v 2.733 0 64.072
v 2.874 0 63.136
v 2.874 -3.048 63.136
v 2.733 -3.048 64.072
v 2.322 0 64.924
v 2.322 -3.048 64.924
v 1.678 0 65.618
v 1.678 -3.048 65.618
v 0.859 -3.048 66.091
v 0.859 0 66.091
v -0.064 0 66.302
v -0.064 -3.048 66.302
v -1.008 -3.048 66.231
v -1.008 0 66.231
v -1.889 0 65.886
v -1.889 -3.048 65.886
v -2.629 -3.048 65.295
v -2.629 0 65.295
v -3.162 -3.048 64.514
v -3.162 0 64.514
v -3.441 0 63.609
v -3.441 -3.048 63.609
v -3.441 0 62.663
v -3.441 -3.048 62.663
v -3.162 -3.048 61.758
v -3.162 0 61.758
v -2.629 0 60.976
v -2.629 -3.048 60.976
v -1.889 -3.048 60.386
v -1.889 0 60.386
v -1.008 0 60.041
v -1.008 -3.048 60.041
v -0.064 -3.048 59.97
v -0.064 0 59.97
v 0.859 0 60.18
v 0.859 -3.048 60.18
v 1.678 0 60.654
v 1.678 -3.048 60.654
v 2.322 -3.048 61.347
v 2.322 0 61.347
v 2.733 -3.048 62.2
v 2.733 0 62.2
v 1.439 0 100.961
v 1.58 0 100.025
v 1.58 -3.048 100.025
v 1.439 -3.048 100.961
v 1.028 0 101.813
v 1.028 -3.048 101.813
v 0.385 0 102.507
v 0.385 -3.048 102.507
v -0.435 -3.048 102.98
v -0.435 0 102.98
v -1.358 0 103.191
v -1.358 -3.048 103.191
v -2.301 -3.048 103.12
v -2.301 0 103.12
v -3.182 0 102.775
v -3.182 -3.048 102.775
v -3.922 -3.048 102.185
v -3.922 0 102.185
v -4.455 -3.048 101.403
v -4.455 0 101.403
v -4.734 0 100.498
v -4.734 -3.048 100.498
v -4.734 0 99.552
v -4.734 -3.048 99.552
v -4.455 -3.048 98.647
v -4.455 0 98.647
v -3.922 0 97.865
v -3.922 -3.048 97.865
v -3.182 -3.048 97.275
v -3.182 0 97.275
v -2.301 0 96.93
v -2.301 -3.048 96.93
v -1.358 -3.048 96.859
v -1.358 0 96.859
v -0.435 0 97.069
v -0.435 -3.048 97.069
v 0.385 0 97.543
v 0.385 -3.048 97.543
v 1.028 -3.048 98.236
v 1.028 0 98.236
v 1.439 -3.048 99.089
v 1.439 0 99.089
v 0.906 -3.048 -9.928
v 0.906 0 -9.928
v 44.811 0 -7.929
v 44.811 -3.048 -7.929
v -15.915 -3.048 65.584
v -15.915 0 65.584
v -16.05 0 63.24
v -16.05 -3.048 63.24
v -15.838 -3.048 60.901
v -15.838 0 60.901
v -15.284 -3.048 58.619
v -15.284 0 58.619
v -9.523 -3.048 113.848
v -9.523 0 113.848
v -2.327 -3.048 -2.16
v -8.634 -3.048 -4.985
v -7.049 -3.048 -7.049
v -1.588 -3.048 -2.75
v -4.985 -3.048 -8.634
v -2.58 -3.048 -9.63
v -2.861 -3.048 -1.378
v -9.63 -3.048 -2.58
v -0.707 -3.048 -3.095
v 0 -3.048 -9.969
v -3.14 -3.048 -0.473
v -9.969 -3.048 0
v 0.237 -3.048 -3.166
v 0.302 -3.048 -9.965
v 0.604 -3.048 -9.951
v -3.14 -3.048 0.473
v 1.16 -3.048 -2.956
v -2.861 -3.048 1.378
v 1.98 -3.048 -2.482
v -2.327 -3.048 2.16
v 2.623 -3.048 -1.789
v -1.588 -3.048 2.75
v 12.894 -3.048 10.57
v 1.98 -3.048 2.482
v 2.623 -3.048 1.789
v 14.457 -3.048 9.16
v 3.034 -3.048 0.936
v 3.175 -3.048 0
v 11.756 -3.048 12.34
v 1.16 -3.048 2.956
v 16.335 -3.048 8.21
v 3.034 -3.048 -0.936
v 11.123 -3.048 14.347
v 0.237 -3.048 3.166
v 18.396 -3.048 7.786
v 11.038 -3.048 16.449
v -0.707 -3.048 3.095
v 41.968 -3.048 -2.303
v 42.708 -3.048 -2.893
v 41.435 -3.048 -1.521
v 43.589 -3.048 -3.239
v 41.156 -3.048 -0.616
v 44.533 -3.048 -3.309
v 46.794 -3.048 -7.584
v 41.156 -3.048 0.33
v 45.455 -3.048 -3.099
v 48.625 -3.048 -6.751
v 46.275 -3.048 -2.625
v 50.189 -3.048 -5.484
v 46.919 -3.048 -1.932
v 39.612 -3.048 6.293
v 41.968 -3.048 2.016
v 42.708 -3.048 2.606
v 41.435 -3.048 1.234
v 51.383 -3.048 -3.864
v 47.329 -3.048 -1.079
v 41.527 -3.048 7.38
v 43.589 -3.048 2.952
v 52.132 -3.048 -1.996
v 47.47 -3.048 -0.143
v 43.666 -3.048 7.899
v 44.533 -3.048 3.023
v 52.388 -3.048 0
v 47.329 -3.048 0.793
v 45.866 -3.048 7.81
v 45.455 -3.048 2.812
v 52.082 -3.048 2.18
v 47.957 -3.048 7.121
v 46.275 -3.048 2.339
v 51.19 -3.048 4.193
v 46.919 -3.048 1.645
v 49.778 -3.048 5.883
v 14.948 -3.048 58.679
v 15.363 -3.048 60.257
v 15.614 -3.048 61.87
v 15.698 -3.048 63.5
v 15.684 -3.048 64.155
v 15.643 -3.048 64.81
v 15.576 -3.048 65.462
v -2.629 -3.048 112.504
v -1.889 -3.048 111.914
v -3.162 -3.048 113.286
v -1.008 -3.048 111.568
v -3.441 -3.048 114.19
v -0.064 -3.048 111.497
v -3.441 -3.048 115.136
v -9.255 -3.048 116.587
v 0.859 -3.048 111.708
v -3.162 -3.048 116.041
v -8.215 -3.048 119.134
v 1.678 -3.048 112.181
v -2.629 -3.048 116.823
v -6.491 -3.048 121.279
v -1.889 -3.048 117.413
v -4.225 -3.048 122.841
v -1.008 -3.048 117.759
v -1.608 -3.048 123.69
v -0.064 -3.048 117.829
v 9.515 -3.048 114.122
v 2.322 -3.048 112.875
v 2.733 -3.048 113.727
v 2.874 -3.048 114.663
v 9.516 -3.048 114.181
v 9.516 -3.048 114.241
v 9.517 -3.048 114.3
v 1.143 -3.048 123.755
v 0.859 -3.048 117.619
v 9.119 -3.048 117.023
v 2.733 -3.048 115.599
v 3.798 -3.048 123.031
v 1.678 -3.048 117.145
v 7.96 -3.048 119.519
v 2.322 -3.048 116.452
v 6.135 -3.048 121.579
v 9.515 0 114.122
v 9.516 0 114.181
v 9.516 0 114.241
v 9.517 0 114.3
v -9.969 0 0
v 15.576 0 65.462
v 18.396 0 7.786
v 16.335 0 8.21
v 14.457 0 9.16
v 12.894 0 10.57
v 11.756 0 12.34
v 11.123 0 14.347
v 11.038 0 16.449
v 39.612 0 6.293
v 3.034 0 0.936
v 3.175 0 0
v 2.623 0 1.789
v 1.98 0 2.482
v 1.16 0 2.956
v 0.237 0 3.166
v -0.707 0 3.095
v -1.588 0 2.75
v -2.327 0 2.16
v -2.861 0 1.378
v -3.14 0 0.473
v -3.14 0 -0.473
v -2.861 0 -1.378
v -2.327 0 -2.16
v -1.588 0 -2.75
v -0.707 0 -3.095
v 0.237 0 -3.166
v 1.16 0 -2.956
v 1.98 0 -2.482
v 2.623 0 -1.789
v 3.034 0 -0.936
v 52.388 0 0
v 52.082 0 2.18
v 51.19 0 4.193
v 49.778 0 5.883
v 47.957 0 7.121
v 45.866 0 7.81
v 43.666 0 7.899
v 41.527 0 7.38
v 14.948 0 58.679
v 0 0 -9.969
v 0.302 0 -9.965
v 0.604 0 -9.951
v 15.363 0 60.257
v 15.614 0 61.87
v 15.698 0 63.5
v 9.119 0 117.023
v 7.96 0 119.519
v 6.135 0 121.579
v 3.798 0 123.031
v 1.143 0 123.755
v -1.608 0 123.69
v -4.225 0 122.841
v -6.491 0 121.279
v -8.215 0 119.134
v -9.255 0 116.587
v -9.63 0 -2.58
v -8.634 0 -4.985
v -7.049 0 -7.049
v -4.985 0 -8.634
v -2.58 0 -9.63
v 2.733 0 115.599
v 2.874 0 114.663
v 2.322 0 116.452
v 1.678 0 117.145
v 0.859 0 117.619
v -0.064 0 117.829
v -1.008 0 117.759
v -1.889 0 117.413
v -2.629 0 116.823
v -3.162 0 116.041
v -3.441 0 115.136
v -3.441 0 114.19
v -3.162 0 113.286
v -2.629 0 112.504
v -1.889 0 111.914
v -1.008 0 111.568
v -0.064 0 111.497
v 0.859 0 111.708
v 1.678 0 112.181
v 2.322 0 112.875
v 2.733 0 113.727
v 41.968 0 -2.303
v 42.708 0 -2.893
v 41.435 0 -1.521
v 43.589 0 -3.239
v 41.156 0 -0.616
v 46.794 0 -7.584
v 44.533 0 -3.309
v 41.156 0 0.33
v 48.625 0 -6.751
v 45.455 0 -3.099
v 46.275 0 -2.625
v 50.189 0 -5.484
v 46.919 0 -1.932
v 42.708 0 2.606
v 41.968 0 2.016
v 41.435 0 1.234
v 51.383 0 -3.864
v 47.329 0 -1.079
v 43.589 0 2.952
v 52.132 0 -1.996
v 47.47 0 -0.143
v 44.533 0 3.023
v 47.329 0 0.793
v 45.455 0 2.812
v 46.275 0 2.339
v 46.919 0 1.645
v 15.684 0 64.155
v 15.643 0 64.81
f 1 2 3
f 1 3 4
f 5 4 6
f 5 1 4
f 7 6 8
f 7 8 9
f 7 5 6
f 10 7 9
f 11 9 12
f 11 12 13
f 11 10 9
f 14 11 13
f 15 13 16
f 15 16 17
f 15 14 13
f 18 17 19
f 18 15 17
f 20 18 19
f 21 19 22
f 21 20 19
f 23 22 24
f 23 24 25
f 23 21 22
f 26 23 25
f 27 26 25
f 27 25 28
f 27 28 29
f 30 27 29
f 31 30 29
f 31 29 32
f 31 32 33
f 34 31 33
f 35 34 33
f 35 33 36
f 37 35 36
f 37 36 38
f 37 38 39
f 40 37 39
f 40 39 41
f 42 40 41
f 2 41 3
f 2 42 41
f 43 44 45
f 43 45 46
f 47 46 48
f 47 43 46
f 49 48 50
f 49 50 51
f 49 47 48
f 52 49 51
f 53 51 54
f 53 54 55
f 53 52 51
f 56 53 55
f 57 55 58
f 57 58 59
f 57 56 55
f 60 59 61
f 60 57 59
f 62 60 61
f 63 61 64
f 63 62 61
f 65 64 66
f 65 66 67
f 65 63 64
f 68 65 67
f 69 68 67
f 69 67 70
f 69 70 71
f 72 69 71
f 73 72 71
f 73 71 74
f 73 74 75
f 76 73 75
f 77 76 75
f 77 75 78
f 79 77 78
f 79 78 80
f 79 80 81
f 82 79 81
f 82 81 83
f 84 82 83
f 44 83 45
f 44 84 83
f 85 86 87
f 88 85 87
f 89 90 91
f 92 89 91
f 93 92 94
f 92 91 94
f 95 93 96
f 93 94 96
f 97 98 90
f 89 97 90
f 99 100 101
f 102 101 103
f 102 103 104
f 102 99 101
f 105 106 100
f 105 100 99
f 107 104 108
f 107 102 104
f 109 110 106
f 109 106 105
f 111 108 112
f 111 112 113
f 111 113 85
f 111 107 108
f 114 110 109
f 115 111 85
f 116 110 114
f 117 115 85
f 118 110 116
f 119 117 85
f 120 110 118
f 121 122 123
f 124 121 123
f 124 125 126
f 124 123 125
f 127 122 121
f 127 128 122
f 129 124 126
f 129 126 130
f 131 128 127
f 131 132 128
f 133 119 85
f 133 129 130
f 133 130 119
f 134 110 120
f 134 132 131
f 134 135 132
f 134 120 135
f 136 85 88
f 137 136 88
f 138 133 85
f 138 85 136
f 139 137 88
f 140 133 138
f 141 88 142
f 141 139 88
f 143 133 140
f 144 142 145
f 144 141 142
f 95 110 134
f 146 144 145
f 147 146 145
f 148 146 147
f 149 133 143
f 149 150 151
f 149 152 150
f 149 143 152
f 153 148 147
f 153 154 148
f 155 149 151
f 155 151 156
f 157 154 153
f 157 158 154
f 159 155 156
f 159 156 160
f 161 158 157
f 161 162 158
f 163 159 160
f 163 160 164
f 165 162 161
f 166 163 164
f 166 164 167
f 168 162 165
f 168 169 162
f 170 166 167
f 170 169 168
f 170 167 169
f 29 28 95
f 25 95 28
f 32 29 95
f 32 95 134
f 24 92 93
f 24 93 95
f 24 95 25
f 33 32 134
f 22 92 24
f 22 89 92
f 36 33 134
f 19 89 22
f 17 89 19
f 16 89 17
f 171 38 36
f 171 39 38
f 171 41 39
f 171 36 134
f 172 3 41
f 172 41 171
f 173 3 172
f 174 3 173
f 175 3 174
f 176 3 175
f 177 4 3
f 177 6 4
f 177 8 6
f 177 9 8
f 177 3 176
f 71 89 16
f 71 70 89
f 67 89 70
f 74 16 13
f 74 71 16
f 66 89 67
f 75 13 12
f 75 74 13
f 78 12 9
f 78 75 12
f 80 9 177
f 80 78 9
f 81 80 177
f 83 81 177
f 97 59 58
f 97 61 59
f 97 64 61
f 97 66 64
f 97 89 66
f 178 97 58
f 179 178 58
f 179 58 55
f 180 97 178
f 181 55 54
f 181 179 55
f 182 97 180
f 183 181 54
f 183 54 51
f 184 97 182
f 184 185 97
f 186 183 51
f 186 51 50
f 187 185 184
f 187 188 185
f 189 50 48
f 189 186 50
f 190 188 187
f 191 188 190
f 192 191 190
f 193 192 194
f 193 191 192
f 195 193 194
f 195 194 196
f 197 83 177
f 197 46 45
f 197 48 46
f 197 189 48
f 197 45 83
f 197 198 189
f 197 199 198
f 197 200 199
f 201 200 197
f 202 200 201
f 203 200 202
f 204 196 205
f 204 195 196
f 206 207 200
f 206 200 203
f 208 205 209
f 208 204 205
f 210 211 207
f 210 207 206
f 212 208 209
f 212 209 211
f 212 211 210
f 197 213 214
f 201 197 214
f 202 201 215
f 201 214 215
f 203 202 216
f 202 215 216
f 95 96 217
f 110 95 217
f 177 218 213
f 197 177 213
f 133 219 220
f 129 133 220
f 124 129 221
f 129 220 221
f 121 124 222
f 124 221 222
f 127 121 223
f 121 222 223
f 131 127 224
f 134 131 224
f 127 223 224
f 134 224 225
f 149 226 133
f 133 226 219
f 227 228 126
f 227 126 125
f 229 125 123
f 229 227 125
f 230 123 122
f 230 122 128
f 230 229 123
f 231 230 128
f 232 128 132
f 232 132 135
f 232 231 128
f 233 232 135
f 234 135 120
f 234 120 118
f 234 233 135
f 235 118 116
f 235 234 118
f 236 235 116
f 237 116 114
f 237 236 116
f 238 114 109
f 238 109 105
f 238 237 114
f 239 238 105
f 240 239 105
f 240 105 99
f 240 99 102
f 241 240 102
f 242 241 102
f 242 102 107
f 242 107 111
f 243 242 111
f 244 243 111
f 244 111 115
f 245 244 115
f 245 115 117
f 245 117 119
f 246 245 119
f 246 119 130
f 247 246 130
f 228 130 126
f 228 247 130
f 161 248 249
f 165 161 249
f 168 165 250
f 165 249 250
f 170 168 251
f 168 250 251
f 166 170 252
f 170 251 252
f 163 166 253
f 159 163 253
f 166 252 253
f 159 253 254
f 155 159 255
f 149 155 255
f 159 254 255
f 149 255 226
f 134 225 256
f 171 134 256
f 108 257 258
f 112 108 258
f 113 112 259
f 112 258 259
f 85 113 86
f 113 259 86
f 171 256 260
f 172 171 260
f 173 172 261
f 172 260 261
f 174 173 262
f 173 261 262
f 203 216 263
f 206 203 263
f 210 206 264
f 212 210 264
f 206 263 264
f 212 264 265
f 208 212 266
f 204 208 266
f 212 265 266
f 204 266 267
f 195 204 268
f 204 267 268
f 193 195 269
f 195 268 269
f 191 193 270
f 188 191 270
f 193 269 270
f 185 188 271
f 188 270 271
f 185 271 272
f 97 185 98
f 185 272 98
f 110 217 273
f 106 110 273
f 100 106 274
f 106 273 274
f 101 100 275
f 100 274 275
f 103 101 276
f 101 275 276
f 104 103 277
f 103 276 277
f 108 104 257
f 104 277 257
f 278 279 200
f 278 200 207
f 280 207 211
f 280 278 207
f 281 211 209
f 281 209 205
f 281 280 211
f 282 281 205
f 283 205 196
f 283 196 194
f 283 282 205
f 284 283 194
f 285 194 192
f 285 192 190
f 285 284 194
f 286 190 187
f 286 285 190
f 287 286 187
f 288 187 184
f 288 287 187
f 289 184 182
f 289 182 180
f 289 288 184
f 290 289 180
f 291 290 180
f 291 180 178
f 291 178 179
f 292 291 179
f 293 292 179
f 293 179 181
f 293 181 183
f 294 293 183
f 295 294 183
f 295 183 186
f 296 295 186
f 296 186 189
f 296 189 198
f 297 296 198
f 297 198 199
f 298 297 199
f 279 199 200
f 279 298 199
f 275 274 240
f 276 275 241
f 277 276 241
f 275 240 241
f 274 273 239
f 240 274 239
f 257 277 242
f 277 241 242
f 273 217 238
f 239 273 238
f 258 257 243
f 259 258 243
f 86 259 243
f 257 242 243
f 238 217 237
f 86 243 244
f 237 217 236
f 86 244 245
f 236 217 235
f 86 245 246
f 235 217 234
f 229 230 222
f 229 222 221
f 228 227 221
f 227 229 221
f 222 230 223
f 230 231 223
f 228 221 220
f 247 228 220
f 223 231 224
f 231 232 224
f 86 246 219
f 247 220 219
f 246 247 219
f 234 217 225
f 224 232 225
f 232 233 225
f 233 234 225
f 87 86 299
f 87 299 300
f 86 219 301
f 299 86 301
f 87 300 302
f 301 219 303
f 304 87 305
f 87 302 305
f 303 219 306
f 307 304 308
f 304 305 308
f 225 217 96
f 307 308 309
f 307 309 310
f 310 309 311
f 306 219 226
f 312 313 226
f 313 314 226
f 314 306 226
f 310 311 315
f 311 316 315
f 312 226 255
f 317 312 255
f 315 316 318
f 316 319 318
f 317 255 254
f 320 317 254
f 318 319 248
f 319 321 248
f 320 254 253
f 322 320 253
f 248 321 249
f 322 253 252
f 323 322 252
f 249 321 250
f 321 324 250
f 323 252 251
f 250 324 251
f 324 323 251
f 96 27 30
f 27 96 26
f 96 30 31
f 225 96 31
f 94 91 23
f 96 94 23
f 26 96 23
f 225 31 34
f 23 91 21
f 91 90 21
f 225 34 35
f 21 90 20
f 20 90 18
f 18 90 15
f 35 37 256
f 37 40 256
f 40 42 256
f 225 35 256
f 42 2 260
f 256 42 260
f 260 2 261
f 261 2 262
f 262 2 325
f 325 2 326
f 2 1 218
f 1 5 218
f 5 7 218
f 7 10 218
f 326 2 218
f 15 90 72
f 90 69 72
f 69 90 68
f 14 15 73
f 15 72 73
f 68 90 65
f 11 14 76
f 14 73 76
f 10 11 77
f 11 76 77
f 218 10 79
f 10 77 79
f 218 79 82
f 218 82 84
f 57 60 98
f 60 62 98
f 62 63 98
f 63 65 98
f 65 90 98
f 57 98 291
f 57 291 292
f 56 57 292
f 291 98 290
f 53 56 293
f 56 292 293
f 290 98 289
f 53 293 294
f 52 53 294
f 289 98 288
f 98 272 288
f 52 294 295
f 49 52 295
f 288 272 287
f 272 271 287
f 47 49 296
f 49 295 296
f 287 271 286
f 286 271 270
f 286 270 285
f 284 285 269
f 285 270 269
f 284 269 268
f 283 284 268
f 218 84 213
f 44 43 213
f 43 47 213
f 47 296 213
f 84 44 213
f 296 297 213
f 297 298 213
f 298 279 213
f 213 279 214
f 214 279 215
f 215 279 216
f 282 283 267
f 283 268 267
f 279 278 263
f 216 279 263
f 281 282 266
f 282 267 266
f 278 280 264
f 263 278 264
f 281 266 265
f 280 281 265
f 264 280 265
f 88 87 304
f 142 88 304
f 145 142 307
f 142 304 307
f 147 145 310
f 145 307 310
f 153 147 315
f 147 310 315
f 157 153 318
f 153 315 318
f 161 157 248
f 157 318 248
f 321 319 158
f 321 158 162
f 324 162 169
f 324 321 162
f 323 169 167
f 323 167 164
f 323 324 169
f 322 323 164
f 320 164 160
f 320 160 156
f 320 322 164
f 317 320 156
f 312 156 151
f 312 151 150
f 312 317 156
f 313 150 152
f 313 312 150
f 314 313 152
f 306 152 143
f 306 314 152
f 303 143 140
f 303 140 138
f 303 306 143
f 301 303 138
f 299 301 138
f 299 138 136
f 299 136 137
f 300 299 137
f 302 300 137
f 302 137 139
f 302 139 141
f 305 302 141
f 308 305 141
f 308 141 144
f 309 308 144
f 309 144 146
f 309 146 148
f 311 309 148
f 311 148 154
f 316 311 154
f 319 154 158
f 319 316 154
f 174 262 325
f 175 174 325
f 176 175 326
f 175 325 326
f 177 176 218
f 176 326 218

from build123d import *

# Parameters (mm, degrees)
F0_R     = 3.175
F1_DEPTH = 3.048


with BuildPart() as f1:
    # F0 (on Front) → F1 (new body)
    with BuildSketch(Plane.XZ):
        with BuildLine():
            ThreePointArc((44.811011276, -7.9292860403), (50.1888776452, -5.4835380571), (52.3875, 0))
            ThreePointArc((52.3875, 0), (47.9572367593, 7.1206177094), (39.611891417, 6.2925838563))
            ThreePointArc((39.611891417, 6.2925838563), (36.9950354855, -2.7253275651), (44.811011276, -7.9292860403))
        make_face()
        with Locations((44.2953519523, -0.143149824)):
            Circle(F0_R, mode=Mode.SUBTRACT)
        with BuildLine():
            ThreePointArc((44.811011276, -7.9292860403), (36.9950354855, -2.7253275651), (39.611891417, 6.2925838563))
            Line((39.611891417, 6.2925838563), (18.3958708033, 7.7857948995))
            ThreePointArc((18.3958708033, 7.7857948995), (12.8944465004, 10.5698187456), (11.0376963734, 16.4493541951))
            Line((11.0376963734, 16.4493541951), (14.947713815, 58.6785307391))
            ThreePointArc((14.947713815, 58.6785307391), (-0.1463299689, 47.6247825372), (-15.2836352123, 58.6192128102))
            Line((-15.2836352123, 58.6192128102), (-9.969479858, 0))
            ThreePointArc((-9.969479858, 0), (0, 9.969479858), (9.969479858, 0))
            ThreePointArc((9.969479858, 0), (7.3628146901, -6.7215689001), (0.905920049, -9.9282343598))
            Line((0.905920049, -9.9282343598), (44.811011276, -7.9292860403))
        make_face()
        with BuildLine():
            ThreePointArc((0, -9.969479858), (0.4534292465, -9.9591631454), (0.905920049, -9.9282343598))
            Line((0.905920049, -9.9282343598), (0, -9.969479858))
        make_face()
        with BuildLine():
            Line((0, -9.969479858), (0.905920049, -9.9282343598))
            ThreePointArc((0.905920049, -9.9282343598), (7.3628146901, -6.7215689001), (9.969479858, 0))
            ThreePointArc((9.969479858, 0), (0, 9.969479858), (-9.969479858, 0))
            ThreePointArc((-9.969479858, 0), (-7.0494868125, -7.0494868125), (0, -9.969479858))
        make_face()
        Circle(F0_R, mode=Mode.SUBTRACT)
        with BuildLine():
            Line((15.5757910153, 65.4619232349), (14.947713815, 58.6785307391))
            ThreePointArc((14.947713815, 58.6785307391), (15.5089493964, 61.060162597), (15.697521229, 63.4997519781))
            ThreePointArc((15.697521229, 63.4997519781), (15.6670594498, 64.4827237842), (15.5757910153, 65.4619232349))
        make_face()
        with BuildLine():
            ThreePointArc((-15.2836352123, 58.6192128102), (-0.1463299689, 47.6247825372), (14.947713815, 58.6785307391))
            Line((14.947713815, 58.6785307391), (15.5757910153, 65.4619232349))
            ThreePointArc((15.5757910153, 65.4619232349), (-0.1158692301, 79.374632427), (-15.9150440924, 65.5841374399))
            Line((-15.9150440924, 65.5841374399), (-15.2836352123, 58.6192128102))
        make_face()
        with Locations((-0.3013272653, 63.1359219551)):
            Circle(F0_R, mode=Mode.SUBTRACT)
        with BuildLine():
            ThreePointArc((-15.9150440924, 65.5841374399), (-15.9876443874, 62.0664731565), (-15.2836352123, 58.6192128102))
            Line((-15.2836352123, 58.6192128102), (-15.9150440924, 65.5841374399))
        make_face()
        with BuildLine():
            ThreePointArc((-15.9150440924, 65.5841374399), (-0.1158692301, 79.374632427), (15.5757910153, 65.4619232349))
            Line((15.5757910153, 65.4619232349), (9.5149043603, 114.1216833297))
            ThreePointArc((9.5149043603, 114.1216833297), (0.1285774786, 104.7759850451), (-9.522687446, 113.8478257686))
            Line((-9.522687446, 113.8478257686), (-15.9150440924, 65.5841374399))
        make_face()
        with Locations((-1.5948739996, 100.0249519781)):
            Circle(F0_R, mode=Mode.SUBTRACT)
        with BuildLine():
            ThreePointArc((-9.522687446, 113.8478257686), (0.1285774786, 104.7759850451), (9.5149043603, 114.1216833297))
            ThreePointArc((9.5149043603, 114.1216833297), (9.5161563004, 114.210837603), (9.516573626, 114.2999996894))
            ThreePointArc((9.516573626, 114.2999996894), (-0.2345770866, 123.8223145789), (-9.522687446, 113.8478257686))
        make_face()
        with Locations((-0.3013272653, 114.663168788)):
            Circle(F0_R, mode=Mode.SUBTRACT)
    extrude(amount=F1_DEPTH)


solid = f1.part
